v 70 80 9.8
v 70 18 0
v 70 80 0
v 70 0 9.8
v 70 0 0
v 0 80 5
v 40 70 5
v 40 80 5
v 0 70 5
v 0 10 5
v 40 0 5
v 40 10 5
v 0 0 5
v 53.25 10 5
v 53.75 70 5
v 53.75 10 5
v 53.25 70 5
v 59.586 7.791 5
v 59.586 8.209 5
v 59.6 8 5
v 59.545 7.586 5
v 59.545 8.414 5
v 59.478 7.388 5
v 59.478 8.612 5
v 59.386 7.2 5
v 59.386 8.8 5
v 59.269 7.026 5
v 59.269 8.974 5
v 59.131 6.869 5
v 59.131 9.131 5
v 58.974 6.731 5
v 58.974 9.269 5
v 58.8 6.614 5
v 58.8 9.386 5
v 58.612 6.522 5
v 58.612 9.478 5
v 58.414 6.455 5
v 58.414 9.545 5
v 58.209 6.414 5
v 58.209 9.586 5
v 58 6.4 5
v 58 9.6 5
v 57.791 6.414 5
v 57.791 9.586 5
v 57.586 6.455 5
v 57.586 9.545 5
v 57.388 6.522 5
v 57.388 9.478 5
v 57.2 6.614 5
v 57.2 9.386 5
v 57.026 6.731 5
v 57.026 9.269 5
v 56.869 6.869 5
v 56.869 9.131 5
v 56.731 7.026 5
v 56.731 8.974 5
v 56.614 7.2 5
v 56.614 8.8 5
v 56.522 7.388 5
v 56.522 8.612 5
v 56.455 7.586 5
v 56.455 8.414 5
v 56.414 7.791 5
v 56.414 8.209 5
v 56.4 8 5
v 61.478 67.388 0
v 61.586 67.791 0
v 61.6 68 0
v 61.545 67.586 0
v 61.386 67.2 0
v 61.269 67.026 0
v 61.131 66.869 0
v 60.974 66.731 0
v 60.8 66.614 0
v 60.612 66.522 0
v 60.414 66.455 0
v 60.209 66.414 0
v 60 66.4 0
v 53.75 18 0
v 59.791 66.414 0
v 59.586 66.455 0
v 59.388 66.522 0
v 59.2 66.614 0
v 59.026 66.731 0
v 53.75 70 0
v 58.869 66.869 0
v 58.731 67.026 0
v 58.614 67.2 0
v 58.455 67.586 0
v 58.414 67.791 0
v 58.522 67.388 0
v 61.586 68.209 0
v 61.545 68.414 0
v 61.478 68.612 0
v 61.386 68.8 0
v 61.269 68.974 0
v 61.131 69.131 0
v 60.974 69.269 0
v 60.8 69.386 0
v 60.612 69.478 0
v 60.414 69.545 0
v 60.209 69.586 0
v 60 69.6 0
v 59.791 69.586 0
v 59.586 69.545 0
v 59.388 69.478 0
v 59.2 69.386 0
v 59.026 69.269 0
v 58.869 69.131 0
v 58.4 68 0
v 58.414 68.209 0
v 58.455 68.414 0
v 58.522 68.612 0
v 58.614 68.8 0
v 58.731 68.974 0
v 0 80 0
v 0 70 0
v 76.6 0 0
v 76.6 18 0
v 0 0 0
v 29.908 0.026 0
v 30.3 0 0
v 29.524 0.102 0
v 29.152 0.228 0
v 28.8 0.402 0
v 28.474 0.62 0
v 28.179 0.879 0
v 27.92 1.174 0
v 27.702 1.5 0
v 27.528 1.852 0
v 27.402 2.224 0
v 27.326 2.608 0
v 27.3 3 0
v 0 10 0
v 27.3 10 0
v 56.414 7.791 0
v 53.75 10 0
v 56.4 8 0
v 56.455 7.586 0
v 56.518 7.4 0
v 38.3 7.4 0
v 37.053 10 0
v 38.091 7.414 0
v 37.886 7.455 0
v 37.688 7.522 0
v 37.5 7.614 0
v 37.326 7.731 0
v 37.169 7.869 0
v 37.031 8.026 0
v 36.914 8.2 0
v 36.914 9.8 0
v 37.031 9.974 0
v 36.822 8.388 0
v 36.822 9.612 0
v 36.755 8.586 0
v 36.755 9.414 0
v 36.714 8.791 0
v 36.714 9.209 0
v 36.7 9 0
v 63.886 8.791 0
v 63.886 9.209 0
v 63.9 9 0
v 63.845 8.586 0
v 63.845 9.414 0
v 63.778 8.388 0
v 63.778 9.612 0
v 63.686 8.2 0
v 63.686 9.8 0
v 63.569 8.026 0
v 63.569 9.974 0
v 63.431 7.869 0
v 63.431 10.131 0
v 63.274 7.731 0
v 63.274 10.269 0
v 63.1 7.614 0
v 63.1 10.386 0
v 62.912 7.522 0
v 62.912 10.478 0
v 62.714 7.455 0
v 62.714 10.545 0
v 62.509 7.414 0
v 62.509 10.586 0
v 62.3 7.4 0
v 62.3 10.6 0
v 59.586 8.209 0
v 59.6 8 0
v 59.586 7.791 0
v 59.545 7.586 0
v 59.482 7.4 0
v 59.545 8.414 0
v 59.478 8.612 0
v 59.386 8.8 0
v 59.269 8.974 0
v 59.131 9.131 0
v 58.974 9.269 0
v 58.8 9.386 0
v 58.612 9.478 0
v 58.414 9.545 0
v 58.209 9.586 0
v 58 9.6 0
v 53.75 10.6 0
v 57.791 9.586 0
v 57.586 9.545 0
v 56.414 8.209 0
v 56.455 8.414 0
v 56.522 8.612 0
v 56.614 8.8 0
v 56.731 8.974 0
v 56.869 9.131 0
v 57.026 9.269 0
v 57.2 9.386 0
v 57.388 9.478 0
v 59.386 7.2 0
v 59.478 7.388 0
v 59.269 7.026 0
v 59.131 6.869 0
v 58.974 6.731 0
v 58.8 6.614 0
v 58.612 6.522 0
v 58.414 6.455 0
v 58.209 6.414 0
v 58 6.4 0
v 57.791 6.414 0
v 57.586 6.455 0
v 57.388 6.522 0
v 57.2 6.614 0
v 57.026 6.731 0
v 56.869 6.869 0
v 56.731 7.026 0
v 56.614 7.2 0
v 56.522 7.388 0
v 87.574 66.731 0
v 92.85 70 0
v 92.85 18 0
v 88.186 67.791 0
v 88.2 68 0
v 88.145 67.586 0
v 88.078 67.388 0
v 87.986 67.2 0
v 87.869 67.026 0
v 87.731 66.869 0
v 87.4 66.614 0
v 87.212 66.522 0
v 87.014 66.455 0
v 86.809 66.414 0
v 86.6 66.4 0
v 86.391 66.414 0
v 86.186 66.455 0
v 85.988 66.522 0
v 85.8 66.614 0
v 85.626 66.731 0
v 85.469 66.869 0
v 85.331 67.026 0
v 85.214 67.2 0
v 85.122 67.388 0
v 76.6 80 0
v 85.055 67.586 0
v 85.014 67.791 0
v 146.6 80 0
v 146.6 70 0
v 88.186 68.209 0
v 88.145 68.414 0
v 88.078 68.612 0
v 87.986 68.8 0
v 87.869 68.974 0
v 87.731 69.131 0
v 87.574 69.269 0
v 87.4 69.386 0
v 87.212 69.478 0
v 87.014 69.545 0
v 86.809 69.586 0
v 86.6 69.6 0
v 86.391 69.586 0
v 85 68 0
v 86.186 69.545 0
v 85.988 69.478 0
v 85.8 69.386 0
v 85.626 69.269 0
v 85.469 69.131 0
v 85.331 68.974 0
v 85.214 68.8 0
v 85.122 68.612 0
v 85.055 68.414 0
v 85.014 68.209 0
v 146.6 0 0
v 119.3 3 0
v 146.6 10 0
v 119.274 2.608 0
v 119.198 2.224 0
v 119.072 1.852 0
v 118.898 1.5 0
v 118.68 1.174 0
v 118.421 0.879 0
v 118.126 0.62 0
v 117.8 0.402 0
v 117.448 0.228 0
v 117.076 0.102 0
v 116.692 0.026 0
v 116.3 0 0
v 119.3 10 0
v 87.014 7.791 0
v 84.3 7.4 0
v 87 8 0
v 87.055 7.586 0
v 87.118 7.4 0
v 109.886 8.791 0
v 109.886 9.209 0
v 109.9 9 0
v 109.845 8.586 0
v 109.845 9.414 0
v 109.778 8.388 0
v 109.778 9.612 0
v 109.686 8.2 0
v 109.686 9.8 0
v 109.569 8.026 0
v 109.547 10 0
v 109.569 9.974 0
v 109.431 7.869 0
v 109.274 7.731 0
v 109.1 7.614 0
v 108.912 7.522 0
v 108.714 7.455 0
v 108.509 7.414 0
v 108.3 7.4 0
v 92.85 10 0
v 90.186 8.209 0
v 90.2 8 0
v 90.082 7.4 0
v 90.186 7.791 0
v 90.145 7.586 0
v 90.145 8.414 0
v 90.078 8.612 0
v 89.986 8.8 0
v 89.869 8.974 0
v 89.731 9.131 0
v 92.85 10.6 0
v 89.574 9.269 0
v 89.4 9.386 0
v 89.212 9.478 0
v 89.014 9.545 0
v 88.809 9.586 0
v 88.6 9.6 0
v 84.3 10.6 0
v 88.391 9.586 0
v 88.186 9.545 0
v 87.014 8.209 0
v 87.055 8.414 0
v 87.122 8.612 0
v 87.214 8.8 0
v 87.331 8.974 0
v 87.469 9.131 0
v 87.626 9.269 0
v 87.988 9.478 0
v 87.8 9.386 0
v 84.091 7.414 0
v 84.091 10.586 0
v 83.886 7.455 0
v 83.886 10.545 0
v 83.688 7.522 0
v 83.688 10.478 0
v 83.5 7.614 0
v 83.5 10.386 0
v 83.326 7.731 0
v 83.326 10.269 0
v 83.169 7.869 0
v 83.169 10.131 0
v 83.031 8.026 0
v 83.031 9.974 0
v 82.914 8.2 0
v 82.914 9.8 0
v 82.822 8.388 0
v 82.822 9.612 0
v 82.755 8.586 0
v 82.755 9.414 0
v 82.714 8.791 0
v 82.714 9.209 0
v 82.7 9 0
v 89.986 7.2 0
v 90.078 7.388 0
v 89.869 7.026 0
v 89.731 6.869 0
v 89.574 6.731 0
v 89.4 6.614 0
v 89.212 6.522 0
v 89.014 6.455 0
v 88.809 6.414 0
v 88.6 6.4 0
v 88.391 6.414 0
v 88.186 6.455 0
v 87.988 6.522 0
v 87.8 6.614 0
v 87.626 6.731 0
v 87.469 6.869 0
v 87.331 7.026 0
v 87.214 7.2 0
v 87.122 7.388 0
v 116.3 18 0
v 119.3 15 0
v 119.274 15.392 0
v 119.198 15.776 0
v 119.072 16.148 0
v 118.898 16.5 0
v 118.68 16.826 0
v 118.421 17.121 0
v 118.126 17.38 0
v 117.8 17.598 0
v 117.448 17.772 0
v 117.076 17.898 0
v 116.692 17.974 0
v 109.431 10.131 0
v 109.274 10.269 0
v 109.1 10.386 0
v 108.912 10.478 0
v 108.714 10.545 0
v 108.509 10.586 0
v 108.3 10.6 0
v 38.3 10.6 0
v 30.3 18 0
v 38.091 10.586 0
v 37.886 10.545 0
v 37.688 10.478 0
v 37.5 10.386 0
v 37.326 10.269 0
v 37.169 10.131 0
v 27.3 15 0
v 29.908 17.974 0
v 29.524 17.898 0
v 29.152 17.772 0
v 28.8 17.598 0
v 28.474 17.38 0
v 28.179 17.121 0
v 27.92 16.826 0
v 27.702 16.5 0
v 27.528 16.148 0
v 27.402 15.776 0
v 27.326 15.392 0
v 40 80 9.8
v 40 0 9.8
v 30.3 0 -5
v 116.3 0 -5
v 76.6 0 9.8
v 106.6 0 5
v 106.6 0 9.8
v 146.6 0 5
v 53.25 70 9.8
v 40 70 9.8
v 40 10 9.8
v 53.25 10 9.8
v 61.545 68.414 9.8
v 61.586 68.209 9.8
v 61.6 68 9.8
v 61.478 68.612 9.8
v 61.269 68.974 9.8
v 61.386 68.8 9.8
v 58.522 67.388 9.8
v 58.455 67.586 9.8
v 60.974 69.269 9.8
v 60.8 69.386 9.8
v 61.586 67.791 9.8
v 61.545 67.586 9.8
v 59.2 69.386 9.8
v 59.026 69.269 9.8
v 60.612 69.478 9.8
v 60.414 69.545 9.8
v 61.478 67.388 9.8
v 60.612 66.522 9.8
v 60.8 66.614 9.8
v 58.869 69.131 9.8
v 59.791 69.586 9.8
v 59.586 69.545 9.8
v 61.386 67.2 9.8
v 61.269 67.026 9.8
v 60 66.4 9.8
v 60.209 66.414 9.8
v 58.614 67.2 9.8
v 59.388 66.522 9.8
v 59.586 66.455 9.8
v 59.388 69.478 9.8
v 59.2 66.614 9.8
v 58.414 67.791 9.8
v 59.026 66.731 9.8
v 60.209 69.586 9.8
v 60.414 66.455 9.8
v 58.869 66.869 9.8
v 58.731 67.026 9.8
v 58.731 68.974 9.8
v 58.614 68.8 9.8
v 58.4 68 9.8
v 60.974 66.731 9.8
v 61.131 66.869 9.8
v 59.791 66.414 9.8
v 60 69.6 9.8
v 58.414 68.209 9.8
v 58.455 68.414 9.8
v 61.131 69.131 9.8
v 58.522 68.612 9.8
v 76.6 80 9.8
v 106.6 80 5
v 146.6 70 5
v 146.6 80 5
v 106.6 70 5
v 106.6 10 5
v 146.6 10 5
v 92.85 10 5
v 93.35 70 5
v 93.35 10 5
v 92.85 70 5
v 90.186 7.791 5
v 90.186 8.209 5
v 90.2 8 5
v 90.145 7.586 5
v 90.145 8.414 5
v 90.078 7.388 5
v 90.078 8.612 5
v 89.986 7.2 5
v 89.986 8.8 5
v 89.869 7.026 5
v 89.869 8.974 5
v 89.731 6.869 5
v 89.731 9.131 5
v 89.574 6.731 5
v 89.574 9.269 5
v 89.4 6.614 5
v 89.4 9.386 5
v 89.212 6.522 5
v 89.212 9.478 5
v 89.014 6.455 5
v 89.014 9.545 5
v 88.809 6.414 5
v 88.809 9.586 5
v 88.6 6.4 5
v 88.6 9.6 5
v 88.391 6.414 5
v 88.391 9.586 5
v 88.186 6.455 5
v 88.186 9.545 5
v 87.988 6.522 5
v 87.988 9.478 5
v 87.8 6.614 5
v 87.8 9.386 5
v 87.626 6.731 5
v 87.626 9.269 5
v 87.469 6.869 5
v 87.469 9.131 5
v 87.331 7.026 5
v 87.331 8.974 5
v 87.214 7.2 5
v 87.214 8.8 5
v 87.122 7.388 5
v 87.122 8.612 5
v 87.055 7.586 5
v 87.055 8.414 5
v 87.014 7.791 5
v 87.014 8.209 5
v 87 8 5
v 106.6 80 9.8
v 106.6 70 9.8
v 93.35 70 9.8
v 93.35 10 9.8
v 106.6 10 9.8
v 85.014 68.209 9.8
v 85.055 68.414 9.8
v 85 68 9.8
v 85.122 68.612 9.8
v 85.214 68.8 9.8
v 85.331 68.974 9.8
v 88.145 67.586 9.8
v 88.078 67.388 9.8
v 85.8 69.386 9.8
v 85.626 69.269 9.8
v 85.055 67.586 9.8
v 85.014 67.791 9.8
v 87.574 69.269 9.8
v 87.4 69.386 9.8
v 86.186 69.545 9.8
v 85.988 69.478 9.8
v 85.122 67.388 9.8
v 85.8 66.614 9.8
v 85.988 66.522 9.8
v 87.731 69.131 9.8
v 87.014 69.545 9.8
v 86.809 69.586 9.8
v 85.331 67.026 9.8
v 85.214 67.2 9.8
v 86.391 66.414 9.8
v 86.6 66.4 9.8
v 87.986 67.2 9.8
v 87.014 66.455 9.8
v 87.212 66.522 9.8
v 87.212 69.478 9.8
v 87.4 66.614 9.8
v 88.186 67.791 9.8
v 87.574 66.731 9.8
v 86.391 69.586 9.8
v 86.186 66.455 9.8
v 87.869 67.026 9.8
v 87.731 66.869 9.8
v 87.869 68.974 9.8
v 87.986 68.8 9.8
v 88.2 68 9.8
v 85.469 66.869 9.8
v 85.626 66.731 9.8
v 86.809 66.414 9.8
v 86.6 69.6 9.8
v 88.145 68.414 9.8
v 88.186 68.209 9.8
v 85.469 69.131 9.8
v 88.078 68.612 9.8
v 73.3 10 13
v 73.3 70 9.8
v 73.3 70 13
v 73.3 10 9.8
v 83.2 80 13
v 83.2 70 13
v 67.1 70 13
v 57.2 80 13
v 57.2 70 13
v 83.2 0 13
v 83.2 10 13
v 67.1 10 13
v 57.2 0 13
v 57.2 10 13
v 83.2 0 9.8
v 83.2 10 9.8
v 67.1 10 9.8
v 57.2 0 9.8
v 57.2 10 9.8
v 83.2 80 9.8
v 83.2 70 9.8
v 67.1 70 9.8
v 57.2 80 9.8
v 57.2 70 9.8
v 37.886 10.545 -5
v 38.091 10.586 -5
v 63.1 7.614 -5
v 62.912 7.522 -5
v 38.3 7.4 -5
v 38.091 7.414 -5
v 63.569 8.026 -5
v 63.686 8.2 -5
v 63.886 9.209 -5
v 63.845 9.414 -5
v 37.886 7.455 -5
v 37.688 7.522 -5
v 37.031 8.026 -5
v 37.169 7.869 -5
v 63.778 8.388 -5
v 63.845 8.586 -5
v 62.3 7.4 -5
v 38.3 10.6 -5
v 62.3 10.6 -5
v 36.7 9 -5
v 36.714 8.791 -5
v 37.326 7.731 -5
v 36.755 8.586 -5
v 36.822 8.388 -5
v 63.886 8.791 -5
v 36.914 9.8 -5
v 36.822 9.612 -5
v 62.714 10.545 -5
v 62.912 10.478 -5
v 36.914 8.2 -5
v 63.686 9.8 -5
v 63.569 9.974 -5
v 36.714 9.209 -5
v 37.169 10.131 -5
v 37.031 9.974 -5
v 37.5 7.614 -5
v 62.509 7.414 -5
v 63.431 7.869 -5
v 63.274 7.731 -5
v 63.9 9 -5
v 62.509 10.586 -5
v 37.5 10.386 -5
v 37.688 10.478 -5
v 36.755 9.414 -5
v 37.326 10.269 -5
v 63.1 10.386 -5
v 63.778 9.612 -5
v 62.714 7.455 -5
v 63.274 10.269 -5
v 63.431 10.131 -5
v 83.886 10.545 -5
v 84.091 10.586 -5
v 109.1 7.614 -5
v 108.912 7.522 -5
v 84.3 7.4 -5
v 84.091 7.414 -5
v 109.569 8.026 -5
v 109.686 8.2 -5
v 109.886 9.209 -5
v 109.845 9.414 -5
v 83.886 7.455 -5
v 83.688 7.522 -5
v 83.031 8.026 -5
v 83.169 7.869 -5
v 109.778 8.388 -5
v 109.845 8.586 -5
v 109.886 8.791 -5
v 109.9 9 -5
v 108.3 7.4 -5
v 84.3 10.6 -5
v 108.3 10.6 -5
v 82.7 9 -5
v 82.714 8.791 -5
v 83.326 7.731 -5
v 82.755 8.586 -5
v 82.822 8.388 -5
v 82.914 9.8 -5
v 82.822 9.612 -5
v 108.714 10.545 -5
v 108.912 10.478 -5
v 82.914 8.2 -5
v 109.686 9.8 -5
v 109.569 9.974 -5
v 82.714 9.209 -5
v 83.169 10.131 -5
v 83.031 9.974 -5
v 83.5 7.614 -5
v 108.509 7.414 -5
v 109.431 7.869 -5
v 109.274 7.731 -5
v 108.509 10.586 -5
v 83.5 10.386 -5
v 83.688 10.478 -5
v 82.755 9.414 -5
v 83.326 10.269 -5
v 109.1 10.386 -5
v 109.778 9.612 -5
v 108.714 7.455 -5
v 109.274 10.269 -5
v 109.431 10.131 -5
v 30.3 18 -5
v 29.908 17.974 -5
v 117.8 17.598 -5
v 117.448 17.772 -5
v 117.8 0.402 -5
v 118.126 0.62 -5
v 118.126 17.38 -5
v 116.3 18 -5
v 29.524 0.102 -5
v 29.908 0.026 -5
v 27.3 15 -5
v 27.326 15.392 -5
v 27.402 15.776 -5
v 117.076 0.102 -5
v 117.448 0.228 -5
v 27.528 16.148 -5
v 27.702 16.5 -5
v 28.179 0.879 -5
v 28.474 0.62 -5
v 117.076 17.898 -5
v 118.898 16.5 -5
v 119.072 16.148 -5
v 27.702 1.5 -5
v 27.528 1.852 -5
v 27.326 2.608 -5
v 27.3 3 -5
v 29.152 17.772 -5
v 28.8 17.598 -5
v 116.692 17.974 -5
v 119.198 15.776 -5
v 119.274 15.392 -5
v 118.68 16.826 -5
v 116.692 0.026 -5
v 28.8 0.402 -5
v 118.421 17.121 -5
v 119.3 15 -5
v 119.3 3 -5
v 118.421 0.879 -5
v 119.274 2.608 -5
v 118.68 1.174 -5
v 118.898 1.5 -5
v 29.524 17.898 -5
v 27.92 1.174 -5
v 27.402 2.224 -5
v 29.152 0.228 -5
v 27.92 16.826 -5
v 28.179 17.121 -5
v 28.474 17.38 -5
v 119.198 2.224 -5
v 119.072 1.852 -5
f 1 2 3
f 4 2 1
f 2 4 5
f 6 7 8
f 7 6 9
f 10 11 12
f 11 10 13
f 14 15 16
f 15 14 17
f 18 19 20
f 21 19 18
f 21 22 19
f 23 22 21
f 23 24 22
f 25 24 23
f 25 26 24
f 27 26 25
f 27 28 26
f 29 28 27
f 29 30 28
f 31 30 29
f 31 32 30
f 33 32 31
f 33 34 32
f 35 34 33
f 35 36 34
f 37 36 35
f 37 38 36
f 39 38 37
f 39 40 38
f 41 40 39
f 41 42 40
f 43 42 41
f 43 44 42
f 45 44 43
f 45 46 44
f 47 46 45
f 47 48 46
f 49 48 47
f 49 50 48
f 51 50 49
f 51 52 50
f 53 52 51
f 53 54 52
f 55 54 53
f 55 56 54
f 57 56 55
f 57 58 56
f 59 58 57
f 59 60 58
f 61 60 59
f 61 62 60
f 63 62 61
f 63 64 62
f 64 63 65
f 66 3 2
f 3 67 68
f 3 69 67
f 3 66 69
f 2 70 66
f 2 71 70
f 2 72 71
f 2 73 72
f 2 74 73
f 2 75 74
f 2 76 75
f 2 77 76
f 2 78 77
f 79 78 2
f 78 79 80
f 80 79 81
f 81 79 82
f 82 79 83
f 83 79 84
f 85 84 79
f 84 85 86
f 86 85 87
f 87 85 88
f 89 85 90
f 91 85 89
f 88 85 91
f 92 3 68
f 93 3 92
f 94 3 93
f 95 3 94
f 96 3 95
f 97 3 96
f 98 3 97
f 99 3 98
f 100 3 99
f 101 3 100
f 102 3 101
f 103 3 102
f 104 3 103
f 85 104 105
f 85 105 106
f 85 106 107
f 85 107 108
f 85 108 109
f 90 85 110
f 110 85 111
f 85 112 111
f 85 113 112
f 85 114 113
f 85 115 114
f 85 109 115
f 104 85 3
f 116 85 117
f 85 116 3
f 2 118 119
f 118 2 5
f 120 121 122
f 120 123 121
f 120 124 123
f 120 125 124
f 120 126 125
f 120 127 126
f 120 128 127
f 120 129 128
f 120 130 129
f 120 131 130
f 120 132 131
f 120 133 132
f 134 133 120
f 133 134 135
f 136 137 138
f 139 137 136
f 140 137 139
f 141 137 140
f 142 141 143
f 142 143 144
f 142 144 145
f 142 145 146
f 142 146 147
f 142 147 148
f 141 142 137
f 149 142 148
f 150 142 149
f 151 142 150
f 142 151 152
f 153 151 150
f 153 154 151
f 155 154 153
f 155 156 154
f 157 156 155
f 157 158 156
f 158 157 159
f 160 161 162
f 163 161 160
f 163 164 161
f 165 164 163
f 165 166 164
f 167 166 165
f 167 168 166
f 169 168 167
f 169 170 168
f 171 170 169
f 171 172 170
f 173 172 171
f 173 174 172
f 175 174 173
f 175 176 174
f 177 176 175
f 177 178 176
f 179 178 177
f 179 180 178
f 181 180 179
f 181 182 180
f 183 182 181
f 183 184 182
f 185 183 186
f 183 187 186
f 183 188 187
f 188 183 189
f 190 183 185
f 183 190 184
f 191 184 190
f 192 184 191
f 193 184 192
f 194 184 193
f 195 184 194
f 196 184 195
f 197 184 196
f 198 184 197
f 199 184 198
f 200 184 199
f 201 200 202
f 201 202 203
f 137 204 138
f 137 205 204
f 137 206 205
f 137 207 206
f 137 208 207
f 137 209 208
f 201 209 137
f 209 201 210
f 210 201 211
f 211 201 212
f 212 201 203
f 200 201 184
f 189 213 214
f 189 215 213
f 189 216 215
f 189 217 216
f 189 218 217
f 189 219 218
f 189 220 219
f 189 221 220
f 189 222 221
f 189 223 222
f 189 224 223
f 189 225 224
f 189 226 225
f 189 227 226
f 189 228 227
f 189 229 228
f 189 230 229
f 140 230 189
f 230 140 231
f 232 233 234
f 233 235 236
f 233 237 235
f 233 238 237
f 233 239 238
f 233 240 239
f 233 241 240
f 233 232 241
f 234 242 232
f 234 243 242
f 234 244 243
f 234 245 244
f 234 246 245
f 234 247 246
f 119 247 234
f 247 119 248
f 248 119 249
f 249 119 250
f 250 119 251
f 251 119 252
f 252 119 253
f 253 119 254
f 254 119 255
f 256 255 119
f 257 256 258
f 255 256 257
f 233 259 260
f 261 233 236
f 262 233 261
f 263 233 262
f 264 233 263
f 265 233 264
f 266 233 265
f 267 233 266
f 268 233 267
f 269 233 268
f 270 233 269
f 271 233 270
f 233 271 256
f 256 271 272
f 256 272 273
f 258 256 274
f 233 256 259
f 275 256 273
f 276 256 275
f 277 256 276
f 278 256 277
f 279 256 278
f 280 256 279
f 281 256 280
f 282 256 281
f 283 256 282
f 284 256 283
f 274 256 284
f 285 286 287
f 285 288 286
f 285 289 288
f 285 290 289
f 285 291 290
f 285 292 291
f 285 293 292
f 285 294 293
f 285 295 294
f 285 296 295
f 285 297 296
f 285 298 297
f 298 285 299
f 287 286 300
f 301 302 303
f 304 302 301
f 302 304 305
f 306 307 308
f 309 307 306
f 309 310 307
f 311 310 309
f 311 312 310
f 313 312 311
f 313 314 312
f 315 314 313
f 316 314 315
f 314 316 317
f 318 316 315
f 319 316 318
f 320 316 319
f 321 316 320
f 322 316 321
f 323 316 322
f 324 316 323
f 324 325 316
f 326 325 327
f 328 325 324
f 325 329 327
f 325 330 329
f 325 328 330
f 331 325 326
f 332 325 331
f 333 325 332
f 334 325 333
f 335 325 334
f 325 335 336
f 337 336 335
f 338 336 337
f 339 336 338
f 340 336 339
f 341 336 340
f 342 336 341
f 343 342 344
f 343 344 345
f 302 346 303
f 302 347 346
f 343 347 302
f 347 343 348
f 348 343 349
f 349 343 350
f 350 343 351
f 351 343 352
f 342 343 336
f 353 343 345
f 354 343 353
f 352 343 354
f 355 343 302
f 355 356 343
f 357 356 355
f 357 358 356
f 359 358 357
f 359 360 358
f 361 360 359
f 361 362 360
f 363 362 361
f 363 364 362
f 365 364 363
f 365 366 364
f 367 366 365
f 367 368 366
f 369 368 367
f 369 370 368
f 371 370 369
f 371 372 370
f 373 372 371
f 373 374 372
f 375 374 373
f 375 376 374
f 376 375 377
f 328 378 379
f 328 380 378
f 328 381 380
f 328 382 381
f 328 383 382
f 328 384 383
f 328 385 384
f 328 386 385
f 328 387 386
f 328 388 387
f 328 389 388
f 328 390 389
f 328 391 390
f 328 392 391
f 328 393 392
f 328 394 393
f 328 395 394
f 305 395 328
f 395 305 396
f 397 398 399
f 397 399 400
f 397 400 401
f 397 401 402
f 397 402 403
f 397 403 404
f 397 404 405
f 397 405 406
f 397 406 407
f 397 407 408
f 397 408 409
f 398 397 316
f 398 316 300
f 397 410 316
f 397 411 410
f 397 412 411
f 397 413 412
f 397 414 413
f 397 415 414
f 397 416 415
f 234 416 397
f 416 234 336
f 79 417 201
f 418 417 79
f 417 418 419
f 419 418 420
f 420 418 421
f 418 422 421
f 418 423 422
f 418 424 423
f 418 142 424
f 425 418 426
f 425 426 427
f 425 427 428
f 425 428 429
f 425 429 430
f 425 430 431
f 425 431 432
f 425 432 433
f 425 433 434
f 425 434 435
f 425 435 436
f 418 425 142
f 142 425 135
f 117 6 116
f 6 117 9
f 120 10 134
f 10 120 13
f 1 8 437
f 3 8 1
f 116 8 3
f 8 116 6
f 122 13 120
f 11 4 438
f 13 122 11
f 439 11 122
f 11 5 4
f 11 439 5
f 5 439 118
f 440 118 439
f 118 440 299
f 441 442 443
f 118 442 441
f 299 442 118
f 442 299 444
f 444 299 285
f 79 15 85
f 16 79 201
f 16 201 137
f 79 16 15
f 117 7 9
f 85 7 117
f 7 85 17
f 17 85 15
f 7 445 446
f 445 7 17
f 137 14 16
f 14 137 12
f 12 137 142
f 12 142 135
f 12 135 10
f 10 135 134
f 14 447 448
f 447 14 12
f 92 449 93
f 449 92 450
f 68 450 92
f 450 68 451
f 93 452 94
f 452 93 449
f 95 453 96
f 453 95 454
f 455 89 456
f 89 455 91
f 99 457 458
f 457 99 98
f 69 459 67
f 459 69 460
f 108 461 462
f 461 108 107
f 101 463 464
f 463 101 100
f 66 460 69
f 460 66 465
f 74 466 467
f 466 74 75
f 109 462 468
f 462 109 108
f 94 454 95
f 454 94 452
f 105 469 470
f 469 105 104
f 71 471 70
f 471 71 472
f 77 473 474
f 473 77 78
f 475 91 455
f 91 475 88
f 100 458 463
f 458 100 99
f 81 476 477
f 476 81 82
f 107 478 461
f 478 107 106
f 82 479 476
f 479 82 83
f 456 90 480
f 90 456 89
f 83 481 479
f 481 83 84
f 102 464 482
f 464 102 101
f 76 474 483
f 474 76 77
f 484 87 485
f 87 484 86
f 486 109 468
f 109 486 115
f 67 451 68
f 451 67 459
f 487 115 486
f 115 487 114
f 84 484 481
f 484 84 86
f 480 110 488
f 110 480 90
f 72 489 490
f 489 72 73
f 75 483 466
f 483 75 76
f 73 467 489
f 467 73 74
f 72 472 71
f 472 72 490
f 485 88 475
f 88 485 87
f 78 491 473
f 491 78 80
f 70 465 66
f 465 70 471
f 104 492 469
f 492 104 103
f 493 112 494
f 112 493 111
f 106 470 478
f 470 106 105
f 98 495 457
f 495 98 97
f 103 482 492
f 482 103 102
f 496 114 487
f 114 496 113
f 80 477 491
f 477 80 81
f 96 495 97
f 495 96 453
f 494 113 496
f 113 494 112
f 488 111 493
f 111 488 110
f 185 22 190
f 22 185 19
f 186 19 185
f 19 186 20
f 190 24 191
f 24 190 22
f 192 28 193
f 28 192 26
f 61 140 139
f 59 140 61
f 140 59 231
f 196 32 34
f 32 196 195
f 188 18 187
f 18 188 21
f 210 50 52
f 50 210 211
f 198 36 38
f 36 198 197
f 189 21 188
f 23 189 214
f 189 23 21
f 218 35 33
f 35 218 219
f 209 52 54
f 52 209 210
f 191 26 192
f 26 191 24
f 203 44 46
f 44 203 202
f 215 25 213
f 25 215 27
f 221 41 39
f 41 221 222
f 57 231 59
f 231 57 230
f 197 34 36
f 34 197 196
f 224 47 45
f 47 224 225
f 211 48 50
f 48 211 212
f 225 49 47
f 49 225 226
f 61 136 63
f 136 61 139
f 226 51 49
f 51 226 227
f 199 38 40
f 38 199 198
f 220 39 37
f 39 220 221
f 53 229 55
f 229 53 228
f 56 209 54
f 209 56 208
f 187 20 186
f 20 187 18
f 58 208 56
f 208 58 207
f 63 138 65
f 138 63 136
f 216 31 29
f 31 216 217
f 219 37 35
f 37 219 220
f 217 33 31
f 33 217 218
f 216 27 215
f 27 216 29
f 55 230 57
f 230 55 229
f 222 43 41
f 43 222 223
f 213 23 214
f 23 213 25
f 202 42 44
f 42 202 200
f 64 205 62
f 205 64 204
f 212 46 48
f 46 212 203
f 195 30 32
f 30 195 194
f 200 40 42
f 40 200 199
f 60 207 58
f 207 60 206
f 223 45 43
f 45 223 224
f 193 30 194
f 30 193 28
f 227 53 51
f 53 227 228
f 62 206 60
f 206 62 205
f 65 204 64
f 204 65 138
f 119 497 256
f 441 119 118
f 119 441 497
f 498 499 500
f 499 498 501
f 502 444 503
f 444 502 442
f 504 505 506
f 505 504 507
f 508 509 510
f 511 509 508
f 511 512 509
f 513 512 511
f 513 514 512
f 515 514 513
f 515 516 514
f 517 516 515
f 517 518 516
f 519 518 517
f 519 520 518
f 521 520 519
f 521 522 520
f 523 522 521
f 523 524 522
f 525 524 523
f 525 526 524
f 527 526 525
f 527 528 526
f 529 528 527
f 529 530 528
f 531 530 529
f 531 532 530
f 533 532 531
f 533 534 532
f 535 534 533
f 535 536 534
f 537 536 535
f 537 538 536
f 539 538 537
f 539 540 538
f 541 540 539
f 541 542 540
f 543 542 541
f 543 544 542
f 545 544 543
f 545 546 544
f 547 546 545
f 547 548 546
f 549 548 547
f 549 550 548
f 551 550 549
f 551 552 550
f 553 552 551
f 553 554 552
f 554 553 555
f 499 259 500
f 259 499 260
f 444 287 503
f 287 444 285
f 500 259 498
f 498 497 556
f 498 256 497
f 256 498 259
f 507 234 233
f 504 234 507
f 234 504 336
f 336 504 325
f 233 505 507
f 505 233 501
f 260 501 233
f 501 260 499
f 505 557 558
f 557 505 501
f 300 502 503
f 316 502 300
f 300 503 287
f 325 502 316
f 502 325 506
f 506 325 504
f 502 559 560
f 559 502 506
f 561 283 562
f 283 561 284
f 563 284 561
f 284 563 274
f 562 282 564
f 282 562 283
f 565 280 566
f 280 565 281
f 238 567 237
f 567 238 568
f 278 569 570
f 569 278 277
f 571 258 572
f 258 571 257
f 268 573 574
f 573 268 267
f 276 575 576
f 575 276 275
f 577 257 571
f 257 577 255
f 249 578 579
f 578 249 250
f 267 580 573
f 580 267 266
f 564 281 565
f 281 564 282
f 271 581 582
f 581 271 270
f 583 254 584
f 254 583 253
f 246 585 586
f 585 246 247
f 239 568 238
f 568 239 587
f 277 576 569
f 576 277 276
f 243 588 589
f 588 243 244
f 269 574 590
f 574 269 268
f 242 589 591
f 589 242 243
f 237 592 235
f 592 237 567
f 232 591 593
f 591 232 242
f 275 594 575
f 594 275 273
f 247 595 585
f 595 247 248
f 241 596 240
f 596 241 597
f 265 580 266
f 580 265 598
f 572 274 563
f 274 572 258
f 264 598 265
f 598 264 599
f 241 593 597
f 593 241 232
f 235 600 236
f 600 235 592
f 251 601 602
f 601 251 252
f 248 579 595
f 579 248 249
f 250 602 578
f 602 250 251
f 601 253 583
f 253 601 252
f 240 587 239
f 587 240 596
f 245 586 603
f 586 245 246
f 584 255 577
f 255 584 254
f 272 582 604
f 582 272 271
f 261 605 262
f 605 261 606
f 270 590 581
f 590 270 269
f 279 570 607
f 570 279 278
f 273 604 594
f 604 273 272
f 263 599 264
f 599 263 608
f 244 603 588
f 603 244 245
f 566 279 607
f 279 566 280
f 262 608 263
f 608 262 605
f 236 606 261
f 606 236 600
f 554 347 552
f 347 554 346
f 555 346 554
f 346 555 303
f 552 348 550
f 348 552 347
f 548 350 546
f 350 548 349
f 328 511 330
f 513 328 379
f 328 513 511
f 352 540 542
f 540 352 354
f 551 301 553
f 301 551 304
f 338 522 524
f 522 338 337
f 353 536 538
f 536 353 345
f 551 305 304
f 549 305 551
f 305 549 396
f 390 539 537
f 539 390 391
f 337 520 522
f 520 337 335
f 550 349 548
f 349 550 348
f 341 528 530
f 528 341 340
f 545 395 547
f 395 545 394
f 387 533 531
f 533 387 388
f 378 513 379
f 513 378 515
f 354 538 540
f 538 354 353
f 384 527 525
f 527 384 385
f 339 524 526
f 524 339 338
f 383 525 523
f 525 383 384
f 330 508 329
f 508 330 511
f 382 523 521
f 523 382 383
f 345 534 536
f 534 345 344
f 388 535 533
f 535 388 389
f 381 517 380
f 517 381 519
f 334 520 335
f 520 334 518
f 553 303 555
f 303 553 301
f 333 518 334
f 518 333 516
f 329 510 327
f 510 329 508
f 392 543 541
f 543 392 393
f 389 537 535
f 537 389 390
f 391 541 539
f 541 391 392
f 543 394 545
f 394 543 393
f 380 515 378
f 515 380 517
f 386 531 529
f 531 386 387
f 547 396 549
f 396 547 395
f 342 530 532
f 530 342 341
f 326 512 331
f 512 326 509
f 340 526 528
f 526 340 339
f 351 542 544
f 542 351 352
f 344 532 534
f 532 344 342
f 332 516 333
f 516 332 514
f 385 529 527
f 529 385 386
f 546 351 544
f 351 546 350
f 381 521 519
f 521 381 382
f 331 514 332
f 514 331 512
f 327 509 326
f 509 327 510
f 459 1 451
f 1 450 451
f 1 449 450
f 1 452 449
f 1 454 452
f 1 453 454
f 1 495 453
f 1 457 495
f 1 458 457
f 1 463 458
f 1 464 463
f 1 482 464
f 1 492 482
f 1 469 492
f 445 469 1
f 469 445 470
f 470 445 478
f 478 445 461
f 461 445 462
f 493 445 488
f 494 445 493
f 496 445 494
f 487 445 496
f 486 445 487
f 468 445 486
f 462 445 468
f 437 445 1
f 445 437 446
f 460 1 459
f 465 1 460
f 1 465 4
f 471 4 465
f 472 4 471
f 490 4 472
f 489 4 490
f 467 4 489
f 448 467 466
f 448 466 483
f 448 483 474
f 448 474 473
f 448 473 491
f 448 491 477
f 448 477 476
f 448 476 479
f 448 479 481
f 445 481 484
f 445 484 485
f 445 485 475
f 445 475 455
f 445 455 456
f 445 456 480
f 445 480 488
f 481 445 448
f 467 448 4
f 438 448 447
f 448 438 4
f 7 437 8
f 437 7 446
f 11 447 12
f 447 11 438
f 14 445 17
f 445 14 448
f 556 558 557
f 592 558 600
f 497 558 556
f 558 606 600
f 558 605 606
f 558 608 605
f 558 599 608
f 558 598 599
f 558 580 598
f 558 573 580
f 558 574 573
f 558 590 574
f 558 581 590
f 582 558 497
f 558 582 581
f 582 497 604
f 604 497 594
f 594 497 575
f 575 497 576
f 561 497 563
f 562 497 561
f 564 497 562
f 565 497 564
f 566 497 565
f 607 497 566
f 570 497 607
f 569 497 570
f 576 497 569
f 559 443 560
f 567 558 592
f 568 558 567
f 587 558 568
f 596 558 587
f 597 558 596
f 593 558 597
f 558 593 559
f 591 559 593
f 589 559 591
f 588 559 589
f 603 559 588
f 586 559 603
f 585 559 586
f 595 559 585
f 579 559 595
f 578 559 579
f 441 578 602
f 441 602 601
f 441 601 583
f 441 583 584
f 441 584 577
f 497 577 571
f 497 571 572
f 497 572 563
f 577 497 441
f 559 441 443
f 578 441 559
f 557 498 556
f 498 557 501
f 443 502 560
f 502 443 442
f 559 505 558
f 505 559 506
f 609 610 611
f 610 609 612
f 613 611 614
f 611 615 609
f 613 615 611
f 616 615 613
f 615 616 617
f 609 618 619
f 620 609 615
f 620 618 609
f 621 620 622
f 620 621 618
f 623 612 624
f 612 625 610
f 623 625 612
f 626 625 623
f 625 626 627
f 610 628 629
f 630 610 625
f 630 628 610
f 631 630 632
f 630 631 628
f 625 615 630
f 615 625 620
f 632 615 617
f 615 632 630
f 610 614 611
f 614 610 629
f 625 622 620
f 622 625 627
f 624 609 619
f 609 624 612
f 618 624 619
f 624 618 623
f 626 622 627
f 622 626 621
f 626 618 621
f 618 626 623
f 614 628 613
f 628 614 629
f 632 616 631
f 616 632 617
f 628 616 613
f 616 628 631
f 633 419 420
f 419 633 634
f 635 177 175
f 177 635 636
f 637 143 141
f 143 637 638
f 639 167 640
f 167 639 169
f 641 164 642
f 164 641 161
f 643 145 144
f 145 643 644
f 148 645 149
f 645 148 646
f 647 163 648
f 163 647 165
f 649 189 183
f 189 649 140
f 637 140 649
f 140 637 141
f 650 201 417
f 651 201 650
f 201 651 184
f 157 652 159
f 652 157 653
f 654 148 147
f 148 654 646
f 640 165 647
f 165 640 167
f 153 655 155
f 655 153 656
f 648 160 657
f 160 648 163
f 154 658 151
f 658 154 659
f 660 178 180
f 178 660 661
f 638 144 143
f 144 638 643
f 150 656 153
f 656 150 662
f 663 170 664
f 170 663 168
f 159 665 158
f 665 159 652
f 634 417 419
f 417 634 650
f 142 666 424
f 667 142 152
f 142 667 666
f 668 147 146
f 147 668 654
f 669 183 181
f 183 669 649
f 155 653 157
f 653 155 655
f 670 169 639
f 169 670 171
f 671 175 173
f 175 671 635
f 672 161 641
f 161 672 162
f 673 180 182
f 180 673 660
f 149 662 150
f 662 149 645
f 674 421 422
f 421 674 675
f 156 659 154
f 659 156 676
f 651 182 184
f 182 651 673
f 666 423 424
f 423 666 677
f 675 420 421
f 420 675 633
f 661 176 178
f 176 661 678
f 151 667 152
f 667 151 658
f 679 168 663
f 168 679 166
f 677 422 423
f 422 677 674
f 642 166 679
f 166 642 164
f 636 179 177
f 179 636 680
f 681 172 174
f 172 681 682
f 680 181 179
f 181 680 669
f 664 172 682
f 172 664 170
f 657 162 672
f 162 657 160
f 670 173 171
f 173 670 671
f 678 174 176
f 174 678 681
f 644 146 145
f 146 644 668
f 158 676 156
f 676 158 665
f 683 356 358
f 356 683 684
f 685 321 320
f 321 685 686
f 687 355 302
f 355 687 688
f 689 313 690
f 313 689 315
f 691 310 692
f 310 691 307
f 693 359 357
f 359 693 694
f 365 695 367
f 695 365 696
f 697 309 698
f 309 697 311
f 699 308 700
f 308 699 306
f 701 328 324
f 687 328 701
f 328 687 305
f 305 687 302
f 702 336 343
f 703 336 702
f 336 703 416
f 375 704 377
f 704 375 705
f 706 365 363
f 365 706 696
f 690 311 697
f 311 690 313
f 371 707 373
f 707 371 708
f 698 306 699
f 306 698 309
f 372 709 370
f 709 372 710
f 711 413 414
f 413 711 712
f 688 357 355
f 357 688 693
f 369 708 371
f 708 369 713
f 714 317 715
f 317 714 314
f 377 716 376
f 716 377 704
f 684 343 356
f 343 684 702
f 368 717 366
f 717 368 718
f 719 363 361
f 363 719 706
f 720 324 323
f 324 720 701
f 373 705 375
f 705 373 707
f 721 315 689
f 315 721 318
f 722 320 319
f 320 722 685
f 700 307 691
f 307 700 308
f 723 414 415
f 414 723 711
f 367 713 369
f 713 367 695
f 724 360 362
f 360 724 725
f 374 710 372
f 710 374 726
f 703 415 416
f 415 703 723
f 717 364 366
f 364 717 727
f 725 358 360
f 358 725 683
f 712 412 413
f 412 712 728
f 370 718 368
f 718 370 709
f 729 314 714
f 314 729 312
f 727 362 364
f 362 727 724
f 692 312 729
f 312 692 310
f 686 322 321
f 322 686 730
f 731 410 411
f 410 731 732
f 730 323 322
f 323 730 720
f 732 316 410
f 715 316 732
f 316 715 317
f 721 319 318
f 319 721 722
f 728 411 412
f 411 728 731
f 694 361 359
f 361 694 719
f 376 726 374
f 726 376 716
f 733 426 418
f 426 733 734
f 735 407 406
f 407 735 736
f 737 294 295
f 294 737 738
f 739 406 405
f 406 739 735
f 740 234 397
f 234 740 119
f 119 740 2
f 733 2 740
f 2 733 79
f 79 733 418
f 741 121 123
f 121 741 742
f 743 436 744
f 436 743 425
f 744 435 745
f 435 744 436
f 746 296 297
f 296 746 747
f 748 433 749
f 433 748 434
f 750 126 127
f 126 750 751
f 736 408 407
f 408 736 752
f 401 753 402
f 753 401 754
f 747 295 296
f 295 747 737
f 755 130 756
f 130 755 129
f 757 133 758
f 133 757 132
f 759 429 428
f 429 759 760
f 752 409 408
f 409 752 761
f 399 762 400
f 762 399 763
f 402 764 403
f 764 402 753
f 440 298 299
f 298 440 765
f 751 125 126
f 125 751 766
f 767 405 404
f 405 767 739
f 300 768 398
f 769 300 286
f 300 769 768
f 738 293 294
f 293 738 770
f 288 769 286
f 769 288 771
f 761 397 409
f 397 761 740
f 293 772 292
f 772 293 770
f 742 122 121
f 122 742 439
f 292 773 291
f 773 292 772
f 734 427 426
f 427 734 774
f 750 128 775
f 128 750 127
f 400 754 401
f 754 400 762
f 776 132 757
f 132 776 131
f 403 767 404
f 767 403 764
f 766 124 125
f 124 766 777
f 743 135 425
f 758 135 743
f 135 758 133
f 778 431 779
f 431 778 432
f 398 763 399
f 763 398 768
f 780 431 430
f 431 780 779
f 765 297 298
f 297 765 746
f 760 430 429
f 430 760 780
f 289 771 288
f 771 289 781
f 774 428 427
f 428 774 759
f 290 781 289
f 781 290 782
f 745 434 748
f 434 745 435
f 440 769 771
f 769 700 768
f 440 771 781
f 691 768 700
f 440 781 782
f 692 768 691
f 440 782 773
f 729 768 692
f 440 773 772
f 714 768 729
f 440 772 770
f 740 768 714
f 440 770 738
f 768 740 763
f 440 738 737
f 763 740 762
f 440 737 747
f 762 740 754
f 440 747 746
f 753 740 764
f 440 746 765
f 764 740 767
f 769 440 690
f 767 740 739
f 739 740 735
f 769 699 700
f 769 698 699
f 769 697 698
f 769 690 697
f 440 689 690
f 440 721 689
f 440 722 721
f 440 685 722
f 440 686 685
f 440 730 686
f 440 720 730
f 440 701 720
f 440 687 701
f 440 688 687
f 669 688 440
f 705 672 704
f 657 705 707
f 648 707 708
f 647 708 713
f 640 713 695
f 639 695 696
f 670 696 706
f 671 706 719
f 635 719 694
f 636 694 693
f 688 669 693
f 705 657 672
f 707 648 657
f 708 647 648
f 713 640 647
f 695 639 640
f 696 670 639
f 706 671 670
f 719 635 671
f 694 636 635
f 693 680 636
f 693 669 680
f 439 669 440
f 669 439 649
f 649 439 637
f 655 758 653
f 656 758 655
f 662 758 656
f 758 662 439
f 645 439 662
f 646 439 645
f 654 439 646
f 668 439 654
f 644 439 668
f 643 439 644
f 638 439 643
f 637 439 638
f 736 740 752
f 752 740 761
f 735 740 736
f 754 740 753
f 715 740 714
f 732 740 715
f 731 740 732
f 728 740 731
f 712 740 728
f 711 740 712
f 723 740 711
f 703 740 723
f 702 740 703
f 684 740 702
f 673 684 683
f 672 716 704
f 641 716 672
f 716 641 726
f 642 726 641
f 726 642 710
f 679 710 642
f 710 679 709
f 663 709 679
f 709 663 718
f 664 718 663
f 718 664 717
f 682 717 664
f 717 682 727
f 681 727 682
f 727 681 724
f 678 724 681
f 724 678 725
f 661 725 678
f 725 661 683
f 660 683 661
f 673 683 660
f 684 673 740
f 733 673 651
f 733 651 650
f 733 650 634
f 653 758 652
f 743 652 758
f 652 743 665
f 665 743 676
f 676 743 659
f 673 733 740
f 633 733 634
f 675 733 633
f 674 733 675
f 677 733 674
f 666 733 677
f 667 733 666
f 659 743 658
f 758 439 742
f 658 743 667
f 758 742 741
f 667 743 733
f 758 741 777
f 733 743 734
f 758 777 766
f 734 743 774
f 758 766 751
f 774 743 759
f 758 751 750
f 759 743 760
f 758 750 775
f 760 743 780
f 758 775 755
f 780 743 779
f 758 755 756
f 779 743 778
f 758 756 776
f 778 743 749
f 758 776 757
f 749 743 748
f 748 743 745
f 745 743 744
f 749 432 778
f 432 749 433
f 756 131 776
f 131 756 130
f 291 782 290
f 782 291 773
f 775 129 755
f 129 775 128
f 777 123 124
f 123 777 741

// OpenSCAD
/*
  Low-cost PFD/ND center alignment and stack fit-check v1.
  Tests the final 6.6 mm physical bezel gap, 40.1 mm visible-opening gap,
  carrier/bezel stack, fascia center mask and an M3 panel seam joiner.

  No heat-set insert is required; use M3 through-bolts and nuts.
*/

$fn = 48;
part = "assembly";

coupon_w = 70;
coupon_h = 80;
carrier_t = 5;
bezel_stack_t = 4.8; // 3.2 base + 0.4 diffuser + 1.2 face
carrier_gap = 6.6;
fascia_center_w = 6.2; // 6.6 gap minus 0.2 mm clearance per bezel edge
visible_border = (203.2-169.7)/2; // 16.75
carrier_open_border = (203.2-170.7)/2; // 16.25
m3_clearance = 3.2;

module rounded_plate(size,r=2) {
    hull()
        for(x=[r,size[0]-r]) for(y=[r,size[1]-r])
            translate([x,y,0]) cylinder(h=size[2],r=r);
}

module carrier_left() {
    difference() {
        cube([coupon_w,coupon_h,carrier_t]);
        translate([-0.1,10,-0.1])
            cube([coupon_w-carrier_open_border+0.1,coupon_h-20,carrier_t+0.2]);
        translate([coupon_w-10,68,-0.1]) cylinder(h=carrier_t+0.2,d=m3_clearance);
        translate([coupon_w-12,8,-0.1]) cylinder(h=carrier_t+0.2,d=m3_clearance);
    }
}

module carrier_right() {
    mirror([1,0,0]) translate([-coupon_w,0,0]) carrier_left();
}

module bezel_left() {
    difference() {
        cube([30,coupon_h,bezel_stack_t]);
        translate([-0.1,10,-0.1])
            cube([30-visible_border+0.1,coupon_h-20,bezel_stack_t+0.2]);
        translate([20,68,-0.1]) cylinder(h=bezel_stack_t+0.2,d=m3_clearance);
    }
}

module bezel_right() {
    mirror([1,0,0]) translate([-30,0,0]) bezel_left();
}

module fascia_center() {
    union() {
        translate([(26-fascia_center_w)/2,10,0])
            cube([fascia_center_w,coupon_h-20,3.2]);
        cube([26,10,3.2]);
        translate([0,coupon_h-10,0]) cube([26,10,3.2]);
    }
}

module carrier_joiner() {
    difference() {
        rounded_plate([92,18,5],3);
        for(x=[23,69])
            translate([x,9,-0.1])
                hull() {
                    translate([-12,0,0]) cylinder(h=5.2,d=m3_clearance);
                    translate([ 12,0,0]) cylinder(h=5.2,d=m3_clearance);
                }
    }
}

module fascia_seam_half() {
    difference() {
        cube([60,30,3.2]);
        translate([50,15,-0.1]) cylinder(h=3.4,d=m3_clearance);
    }
}

module fascia_seam_joiner() {
    difference() {
        rounded_plate([70,16,3],3);
        for(x=[10,60]) translate([x,8,-0.1]) cylinder(h=3.2,d=m3_clearance);
    }
}

module assembly_preview() {
    color("steelblue") carrier_left();
    color("slategray") translate([coupon_w+carrier_gap,0,0]) carrier_right();
    color("ivory") translate([coupon_w-30,0,carrier_t]) bezel_left();
    color("ivory") translate([coupon_w+carrier_gap,0,carrier_t]) bezel_right();
    color("black") translate([coupon_w+(carrier_gap-fascia_center_w)/2-13,
                              0,carrier_t+bezel_stack_t]) fascia_center();
    color("orange") translate([coupon_w-46+carrier_gap/2,0,-5]) carrier_joiner();
}

if(part=="carrier_left") carrier_left();
else if(part=="carrier_right") carrier_right();
else if(part=="bezel_left") bezel_left();
else if(part=="bezel_right") bezel_right();
else if(part=="fascia_center") fascia_center();
else if(part=="carrier_joiner") carrier_joiner();
else if(part=="fascia_seam_left") fascia_seam_half();
else if(part=="fascia_seam_right") mirror([1,0,0]) translate([-60,0,0]) fascia_seam_half();
else if(part=="fascia_seam_joiner") fascia_seam_joiner();
else assembly_preview();
